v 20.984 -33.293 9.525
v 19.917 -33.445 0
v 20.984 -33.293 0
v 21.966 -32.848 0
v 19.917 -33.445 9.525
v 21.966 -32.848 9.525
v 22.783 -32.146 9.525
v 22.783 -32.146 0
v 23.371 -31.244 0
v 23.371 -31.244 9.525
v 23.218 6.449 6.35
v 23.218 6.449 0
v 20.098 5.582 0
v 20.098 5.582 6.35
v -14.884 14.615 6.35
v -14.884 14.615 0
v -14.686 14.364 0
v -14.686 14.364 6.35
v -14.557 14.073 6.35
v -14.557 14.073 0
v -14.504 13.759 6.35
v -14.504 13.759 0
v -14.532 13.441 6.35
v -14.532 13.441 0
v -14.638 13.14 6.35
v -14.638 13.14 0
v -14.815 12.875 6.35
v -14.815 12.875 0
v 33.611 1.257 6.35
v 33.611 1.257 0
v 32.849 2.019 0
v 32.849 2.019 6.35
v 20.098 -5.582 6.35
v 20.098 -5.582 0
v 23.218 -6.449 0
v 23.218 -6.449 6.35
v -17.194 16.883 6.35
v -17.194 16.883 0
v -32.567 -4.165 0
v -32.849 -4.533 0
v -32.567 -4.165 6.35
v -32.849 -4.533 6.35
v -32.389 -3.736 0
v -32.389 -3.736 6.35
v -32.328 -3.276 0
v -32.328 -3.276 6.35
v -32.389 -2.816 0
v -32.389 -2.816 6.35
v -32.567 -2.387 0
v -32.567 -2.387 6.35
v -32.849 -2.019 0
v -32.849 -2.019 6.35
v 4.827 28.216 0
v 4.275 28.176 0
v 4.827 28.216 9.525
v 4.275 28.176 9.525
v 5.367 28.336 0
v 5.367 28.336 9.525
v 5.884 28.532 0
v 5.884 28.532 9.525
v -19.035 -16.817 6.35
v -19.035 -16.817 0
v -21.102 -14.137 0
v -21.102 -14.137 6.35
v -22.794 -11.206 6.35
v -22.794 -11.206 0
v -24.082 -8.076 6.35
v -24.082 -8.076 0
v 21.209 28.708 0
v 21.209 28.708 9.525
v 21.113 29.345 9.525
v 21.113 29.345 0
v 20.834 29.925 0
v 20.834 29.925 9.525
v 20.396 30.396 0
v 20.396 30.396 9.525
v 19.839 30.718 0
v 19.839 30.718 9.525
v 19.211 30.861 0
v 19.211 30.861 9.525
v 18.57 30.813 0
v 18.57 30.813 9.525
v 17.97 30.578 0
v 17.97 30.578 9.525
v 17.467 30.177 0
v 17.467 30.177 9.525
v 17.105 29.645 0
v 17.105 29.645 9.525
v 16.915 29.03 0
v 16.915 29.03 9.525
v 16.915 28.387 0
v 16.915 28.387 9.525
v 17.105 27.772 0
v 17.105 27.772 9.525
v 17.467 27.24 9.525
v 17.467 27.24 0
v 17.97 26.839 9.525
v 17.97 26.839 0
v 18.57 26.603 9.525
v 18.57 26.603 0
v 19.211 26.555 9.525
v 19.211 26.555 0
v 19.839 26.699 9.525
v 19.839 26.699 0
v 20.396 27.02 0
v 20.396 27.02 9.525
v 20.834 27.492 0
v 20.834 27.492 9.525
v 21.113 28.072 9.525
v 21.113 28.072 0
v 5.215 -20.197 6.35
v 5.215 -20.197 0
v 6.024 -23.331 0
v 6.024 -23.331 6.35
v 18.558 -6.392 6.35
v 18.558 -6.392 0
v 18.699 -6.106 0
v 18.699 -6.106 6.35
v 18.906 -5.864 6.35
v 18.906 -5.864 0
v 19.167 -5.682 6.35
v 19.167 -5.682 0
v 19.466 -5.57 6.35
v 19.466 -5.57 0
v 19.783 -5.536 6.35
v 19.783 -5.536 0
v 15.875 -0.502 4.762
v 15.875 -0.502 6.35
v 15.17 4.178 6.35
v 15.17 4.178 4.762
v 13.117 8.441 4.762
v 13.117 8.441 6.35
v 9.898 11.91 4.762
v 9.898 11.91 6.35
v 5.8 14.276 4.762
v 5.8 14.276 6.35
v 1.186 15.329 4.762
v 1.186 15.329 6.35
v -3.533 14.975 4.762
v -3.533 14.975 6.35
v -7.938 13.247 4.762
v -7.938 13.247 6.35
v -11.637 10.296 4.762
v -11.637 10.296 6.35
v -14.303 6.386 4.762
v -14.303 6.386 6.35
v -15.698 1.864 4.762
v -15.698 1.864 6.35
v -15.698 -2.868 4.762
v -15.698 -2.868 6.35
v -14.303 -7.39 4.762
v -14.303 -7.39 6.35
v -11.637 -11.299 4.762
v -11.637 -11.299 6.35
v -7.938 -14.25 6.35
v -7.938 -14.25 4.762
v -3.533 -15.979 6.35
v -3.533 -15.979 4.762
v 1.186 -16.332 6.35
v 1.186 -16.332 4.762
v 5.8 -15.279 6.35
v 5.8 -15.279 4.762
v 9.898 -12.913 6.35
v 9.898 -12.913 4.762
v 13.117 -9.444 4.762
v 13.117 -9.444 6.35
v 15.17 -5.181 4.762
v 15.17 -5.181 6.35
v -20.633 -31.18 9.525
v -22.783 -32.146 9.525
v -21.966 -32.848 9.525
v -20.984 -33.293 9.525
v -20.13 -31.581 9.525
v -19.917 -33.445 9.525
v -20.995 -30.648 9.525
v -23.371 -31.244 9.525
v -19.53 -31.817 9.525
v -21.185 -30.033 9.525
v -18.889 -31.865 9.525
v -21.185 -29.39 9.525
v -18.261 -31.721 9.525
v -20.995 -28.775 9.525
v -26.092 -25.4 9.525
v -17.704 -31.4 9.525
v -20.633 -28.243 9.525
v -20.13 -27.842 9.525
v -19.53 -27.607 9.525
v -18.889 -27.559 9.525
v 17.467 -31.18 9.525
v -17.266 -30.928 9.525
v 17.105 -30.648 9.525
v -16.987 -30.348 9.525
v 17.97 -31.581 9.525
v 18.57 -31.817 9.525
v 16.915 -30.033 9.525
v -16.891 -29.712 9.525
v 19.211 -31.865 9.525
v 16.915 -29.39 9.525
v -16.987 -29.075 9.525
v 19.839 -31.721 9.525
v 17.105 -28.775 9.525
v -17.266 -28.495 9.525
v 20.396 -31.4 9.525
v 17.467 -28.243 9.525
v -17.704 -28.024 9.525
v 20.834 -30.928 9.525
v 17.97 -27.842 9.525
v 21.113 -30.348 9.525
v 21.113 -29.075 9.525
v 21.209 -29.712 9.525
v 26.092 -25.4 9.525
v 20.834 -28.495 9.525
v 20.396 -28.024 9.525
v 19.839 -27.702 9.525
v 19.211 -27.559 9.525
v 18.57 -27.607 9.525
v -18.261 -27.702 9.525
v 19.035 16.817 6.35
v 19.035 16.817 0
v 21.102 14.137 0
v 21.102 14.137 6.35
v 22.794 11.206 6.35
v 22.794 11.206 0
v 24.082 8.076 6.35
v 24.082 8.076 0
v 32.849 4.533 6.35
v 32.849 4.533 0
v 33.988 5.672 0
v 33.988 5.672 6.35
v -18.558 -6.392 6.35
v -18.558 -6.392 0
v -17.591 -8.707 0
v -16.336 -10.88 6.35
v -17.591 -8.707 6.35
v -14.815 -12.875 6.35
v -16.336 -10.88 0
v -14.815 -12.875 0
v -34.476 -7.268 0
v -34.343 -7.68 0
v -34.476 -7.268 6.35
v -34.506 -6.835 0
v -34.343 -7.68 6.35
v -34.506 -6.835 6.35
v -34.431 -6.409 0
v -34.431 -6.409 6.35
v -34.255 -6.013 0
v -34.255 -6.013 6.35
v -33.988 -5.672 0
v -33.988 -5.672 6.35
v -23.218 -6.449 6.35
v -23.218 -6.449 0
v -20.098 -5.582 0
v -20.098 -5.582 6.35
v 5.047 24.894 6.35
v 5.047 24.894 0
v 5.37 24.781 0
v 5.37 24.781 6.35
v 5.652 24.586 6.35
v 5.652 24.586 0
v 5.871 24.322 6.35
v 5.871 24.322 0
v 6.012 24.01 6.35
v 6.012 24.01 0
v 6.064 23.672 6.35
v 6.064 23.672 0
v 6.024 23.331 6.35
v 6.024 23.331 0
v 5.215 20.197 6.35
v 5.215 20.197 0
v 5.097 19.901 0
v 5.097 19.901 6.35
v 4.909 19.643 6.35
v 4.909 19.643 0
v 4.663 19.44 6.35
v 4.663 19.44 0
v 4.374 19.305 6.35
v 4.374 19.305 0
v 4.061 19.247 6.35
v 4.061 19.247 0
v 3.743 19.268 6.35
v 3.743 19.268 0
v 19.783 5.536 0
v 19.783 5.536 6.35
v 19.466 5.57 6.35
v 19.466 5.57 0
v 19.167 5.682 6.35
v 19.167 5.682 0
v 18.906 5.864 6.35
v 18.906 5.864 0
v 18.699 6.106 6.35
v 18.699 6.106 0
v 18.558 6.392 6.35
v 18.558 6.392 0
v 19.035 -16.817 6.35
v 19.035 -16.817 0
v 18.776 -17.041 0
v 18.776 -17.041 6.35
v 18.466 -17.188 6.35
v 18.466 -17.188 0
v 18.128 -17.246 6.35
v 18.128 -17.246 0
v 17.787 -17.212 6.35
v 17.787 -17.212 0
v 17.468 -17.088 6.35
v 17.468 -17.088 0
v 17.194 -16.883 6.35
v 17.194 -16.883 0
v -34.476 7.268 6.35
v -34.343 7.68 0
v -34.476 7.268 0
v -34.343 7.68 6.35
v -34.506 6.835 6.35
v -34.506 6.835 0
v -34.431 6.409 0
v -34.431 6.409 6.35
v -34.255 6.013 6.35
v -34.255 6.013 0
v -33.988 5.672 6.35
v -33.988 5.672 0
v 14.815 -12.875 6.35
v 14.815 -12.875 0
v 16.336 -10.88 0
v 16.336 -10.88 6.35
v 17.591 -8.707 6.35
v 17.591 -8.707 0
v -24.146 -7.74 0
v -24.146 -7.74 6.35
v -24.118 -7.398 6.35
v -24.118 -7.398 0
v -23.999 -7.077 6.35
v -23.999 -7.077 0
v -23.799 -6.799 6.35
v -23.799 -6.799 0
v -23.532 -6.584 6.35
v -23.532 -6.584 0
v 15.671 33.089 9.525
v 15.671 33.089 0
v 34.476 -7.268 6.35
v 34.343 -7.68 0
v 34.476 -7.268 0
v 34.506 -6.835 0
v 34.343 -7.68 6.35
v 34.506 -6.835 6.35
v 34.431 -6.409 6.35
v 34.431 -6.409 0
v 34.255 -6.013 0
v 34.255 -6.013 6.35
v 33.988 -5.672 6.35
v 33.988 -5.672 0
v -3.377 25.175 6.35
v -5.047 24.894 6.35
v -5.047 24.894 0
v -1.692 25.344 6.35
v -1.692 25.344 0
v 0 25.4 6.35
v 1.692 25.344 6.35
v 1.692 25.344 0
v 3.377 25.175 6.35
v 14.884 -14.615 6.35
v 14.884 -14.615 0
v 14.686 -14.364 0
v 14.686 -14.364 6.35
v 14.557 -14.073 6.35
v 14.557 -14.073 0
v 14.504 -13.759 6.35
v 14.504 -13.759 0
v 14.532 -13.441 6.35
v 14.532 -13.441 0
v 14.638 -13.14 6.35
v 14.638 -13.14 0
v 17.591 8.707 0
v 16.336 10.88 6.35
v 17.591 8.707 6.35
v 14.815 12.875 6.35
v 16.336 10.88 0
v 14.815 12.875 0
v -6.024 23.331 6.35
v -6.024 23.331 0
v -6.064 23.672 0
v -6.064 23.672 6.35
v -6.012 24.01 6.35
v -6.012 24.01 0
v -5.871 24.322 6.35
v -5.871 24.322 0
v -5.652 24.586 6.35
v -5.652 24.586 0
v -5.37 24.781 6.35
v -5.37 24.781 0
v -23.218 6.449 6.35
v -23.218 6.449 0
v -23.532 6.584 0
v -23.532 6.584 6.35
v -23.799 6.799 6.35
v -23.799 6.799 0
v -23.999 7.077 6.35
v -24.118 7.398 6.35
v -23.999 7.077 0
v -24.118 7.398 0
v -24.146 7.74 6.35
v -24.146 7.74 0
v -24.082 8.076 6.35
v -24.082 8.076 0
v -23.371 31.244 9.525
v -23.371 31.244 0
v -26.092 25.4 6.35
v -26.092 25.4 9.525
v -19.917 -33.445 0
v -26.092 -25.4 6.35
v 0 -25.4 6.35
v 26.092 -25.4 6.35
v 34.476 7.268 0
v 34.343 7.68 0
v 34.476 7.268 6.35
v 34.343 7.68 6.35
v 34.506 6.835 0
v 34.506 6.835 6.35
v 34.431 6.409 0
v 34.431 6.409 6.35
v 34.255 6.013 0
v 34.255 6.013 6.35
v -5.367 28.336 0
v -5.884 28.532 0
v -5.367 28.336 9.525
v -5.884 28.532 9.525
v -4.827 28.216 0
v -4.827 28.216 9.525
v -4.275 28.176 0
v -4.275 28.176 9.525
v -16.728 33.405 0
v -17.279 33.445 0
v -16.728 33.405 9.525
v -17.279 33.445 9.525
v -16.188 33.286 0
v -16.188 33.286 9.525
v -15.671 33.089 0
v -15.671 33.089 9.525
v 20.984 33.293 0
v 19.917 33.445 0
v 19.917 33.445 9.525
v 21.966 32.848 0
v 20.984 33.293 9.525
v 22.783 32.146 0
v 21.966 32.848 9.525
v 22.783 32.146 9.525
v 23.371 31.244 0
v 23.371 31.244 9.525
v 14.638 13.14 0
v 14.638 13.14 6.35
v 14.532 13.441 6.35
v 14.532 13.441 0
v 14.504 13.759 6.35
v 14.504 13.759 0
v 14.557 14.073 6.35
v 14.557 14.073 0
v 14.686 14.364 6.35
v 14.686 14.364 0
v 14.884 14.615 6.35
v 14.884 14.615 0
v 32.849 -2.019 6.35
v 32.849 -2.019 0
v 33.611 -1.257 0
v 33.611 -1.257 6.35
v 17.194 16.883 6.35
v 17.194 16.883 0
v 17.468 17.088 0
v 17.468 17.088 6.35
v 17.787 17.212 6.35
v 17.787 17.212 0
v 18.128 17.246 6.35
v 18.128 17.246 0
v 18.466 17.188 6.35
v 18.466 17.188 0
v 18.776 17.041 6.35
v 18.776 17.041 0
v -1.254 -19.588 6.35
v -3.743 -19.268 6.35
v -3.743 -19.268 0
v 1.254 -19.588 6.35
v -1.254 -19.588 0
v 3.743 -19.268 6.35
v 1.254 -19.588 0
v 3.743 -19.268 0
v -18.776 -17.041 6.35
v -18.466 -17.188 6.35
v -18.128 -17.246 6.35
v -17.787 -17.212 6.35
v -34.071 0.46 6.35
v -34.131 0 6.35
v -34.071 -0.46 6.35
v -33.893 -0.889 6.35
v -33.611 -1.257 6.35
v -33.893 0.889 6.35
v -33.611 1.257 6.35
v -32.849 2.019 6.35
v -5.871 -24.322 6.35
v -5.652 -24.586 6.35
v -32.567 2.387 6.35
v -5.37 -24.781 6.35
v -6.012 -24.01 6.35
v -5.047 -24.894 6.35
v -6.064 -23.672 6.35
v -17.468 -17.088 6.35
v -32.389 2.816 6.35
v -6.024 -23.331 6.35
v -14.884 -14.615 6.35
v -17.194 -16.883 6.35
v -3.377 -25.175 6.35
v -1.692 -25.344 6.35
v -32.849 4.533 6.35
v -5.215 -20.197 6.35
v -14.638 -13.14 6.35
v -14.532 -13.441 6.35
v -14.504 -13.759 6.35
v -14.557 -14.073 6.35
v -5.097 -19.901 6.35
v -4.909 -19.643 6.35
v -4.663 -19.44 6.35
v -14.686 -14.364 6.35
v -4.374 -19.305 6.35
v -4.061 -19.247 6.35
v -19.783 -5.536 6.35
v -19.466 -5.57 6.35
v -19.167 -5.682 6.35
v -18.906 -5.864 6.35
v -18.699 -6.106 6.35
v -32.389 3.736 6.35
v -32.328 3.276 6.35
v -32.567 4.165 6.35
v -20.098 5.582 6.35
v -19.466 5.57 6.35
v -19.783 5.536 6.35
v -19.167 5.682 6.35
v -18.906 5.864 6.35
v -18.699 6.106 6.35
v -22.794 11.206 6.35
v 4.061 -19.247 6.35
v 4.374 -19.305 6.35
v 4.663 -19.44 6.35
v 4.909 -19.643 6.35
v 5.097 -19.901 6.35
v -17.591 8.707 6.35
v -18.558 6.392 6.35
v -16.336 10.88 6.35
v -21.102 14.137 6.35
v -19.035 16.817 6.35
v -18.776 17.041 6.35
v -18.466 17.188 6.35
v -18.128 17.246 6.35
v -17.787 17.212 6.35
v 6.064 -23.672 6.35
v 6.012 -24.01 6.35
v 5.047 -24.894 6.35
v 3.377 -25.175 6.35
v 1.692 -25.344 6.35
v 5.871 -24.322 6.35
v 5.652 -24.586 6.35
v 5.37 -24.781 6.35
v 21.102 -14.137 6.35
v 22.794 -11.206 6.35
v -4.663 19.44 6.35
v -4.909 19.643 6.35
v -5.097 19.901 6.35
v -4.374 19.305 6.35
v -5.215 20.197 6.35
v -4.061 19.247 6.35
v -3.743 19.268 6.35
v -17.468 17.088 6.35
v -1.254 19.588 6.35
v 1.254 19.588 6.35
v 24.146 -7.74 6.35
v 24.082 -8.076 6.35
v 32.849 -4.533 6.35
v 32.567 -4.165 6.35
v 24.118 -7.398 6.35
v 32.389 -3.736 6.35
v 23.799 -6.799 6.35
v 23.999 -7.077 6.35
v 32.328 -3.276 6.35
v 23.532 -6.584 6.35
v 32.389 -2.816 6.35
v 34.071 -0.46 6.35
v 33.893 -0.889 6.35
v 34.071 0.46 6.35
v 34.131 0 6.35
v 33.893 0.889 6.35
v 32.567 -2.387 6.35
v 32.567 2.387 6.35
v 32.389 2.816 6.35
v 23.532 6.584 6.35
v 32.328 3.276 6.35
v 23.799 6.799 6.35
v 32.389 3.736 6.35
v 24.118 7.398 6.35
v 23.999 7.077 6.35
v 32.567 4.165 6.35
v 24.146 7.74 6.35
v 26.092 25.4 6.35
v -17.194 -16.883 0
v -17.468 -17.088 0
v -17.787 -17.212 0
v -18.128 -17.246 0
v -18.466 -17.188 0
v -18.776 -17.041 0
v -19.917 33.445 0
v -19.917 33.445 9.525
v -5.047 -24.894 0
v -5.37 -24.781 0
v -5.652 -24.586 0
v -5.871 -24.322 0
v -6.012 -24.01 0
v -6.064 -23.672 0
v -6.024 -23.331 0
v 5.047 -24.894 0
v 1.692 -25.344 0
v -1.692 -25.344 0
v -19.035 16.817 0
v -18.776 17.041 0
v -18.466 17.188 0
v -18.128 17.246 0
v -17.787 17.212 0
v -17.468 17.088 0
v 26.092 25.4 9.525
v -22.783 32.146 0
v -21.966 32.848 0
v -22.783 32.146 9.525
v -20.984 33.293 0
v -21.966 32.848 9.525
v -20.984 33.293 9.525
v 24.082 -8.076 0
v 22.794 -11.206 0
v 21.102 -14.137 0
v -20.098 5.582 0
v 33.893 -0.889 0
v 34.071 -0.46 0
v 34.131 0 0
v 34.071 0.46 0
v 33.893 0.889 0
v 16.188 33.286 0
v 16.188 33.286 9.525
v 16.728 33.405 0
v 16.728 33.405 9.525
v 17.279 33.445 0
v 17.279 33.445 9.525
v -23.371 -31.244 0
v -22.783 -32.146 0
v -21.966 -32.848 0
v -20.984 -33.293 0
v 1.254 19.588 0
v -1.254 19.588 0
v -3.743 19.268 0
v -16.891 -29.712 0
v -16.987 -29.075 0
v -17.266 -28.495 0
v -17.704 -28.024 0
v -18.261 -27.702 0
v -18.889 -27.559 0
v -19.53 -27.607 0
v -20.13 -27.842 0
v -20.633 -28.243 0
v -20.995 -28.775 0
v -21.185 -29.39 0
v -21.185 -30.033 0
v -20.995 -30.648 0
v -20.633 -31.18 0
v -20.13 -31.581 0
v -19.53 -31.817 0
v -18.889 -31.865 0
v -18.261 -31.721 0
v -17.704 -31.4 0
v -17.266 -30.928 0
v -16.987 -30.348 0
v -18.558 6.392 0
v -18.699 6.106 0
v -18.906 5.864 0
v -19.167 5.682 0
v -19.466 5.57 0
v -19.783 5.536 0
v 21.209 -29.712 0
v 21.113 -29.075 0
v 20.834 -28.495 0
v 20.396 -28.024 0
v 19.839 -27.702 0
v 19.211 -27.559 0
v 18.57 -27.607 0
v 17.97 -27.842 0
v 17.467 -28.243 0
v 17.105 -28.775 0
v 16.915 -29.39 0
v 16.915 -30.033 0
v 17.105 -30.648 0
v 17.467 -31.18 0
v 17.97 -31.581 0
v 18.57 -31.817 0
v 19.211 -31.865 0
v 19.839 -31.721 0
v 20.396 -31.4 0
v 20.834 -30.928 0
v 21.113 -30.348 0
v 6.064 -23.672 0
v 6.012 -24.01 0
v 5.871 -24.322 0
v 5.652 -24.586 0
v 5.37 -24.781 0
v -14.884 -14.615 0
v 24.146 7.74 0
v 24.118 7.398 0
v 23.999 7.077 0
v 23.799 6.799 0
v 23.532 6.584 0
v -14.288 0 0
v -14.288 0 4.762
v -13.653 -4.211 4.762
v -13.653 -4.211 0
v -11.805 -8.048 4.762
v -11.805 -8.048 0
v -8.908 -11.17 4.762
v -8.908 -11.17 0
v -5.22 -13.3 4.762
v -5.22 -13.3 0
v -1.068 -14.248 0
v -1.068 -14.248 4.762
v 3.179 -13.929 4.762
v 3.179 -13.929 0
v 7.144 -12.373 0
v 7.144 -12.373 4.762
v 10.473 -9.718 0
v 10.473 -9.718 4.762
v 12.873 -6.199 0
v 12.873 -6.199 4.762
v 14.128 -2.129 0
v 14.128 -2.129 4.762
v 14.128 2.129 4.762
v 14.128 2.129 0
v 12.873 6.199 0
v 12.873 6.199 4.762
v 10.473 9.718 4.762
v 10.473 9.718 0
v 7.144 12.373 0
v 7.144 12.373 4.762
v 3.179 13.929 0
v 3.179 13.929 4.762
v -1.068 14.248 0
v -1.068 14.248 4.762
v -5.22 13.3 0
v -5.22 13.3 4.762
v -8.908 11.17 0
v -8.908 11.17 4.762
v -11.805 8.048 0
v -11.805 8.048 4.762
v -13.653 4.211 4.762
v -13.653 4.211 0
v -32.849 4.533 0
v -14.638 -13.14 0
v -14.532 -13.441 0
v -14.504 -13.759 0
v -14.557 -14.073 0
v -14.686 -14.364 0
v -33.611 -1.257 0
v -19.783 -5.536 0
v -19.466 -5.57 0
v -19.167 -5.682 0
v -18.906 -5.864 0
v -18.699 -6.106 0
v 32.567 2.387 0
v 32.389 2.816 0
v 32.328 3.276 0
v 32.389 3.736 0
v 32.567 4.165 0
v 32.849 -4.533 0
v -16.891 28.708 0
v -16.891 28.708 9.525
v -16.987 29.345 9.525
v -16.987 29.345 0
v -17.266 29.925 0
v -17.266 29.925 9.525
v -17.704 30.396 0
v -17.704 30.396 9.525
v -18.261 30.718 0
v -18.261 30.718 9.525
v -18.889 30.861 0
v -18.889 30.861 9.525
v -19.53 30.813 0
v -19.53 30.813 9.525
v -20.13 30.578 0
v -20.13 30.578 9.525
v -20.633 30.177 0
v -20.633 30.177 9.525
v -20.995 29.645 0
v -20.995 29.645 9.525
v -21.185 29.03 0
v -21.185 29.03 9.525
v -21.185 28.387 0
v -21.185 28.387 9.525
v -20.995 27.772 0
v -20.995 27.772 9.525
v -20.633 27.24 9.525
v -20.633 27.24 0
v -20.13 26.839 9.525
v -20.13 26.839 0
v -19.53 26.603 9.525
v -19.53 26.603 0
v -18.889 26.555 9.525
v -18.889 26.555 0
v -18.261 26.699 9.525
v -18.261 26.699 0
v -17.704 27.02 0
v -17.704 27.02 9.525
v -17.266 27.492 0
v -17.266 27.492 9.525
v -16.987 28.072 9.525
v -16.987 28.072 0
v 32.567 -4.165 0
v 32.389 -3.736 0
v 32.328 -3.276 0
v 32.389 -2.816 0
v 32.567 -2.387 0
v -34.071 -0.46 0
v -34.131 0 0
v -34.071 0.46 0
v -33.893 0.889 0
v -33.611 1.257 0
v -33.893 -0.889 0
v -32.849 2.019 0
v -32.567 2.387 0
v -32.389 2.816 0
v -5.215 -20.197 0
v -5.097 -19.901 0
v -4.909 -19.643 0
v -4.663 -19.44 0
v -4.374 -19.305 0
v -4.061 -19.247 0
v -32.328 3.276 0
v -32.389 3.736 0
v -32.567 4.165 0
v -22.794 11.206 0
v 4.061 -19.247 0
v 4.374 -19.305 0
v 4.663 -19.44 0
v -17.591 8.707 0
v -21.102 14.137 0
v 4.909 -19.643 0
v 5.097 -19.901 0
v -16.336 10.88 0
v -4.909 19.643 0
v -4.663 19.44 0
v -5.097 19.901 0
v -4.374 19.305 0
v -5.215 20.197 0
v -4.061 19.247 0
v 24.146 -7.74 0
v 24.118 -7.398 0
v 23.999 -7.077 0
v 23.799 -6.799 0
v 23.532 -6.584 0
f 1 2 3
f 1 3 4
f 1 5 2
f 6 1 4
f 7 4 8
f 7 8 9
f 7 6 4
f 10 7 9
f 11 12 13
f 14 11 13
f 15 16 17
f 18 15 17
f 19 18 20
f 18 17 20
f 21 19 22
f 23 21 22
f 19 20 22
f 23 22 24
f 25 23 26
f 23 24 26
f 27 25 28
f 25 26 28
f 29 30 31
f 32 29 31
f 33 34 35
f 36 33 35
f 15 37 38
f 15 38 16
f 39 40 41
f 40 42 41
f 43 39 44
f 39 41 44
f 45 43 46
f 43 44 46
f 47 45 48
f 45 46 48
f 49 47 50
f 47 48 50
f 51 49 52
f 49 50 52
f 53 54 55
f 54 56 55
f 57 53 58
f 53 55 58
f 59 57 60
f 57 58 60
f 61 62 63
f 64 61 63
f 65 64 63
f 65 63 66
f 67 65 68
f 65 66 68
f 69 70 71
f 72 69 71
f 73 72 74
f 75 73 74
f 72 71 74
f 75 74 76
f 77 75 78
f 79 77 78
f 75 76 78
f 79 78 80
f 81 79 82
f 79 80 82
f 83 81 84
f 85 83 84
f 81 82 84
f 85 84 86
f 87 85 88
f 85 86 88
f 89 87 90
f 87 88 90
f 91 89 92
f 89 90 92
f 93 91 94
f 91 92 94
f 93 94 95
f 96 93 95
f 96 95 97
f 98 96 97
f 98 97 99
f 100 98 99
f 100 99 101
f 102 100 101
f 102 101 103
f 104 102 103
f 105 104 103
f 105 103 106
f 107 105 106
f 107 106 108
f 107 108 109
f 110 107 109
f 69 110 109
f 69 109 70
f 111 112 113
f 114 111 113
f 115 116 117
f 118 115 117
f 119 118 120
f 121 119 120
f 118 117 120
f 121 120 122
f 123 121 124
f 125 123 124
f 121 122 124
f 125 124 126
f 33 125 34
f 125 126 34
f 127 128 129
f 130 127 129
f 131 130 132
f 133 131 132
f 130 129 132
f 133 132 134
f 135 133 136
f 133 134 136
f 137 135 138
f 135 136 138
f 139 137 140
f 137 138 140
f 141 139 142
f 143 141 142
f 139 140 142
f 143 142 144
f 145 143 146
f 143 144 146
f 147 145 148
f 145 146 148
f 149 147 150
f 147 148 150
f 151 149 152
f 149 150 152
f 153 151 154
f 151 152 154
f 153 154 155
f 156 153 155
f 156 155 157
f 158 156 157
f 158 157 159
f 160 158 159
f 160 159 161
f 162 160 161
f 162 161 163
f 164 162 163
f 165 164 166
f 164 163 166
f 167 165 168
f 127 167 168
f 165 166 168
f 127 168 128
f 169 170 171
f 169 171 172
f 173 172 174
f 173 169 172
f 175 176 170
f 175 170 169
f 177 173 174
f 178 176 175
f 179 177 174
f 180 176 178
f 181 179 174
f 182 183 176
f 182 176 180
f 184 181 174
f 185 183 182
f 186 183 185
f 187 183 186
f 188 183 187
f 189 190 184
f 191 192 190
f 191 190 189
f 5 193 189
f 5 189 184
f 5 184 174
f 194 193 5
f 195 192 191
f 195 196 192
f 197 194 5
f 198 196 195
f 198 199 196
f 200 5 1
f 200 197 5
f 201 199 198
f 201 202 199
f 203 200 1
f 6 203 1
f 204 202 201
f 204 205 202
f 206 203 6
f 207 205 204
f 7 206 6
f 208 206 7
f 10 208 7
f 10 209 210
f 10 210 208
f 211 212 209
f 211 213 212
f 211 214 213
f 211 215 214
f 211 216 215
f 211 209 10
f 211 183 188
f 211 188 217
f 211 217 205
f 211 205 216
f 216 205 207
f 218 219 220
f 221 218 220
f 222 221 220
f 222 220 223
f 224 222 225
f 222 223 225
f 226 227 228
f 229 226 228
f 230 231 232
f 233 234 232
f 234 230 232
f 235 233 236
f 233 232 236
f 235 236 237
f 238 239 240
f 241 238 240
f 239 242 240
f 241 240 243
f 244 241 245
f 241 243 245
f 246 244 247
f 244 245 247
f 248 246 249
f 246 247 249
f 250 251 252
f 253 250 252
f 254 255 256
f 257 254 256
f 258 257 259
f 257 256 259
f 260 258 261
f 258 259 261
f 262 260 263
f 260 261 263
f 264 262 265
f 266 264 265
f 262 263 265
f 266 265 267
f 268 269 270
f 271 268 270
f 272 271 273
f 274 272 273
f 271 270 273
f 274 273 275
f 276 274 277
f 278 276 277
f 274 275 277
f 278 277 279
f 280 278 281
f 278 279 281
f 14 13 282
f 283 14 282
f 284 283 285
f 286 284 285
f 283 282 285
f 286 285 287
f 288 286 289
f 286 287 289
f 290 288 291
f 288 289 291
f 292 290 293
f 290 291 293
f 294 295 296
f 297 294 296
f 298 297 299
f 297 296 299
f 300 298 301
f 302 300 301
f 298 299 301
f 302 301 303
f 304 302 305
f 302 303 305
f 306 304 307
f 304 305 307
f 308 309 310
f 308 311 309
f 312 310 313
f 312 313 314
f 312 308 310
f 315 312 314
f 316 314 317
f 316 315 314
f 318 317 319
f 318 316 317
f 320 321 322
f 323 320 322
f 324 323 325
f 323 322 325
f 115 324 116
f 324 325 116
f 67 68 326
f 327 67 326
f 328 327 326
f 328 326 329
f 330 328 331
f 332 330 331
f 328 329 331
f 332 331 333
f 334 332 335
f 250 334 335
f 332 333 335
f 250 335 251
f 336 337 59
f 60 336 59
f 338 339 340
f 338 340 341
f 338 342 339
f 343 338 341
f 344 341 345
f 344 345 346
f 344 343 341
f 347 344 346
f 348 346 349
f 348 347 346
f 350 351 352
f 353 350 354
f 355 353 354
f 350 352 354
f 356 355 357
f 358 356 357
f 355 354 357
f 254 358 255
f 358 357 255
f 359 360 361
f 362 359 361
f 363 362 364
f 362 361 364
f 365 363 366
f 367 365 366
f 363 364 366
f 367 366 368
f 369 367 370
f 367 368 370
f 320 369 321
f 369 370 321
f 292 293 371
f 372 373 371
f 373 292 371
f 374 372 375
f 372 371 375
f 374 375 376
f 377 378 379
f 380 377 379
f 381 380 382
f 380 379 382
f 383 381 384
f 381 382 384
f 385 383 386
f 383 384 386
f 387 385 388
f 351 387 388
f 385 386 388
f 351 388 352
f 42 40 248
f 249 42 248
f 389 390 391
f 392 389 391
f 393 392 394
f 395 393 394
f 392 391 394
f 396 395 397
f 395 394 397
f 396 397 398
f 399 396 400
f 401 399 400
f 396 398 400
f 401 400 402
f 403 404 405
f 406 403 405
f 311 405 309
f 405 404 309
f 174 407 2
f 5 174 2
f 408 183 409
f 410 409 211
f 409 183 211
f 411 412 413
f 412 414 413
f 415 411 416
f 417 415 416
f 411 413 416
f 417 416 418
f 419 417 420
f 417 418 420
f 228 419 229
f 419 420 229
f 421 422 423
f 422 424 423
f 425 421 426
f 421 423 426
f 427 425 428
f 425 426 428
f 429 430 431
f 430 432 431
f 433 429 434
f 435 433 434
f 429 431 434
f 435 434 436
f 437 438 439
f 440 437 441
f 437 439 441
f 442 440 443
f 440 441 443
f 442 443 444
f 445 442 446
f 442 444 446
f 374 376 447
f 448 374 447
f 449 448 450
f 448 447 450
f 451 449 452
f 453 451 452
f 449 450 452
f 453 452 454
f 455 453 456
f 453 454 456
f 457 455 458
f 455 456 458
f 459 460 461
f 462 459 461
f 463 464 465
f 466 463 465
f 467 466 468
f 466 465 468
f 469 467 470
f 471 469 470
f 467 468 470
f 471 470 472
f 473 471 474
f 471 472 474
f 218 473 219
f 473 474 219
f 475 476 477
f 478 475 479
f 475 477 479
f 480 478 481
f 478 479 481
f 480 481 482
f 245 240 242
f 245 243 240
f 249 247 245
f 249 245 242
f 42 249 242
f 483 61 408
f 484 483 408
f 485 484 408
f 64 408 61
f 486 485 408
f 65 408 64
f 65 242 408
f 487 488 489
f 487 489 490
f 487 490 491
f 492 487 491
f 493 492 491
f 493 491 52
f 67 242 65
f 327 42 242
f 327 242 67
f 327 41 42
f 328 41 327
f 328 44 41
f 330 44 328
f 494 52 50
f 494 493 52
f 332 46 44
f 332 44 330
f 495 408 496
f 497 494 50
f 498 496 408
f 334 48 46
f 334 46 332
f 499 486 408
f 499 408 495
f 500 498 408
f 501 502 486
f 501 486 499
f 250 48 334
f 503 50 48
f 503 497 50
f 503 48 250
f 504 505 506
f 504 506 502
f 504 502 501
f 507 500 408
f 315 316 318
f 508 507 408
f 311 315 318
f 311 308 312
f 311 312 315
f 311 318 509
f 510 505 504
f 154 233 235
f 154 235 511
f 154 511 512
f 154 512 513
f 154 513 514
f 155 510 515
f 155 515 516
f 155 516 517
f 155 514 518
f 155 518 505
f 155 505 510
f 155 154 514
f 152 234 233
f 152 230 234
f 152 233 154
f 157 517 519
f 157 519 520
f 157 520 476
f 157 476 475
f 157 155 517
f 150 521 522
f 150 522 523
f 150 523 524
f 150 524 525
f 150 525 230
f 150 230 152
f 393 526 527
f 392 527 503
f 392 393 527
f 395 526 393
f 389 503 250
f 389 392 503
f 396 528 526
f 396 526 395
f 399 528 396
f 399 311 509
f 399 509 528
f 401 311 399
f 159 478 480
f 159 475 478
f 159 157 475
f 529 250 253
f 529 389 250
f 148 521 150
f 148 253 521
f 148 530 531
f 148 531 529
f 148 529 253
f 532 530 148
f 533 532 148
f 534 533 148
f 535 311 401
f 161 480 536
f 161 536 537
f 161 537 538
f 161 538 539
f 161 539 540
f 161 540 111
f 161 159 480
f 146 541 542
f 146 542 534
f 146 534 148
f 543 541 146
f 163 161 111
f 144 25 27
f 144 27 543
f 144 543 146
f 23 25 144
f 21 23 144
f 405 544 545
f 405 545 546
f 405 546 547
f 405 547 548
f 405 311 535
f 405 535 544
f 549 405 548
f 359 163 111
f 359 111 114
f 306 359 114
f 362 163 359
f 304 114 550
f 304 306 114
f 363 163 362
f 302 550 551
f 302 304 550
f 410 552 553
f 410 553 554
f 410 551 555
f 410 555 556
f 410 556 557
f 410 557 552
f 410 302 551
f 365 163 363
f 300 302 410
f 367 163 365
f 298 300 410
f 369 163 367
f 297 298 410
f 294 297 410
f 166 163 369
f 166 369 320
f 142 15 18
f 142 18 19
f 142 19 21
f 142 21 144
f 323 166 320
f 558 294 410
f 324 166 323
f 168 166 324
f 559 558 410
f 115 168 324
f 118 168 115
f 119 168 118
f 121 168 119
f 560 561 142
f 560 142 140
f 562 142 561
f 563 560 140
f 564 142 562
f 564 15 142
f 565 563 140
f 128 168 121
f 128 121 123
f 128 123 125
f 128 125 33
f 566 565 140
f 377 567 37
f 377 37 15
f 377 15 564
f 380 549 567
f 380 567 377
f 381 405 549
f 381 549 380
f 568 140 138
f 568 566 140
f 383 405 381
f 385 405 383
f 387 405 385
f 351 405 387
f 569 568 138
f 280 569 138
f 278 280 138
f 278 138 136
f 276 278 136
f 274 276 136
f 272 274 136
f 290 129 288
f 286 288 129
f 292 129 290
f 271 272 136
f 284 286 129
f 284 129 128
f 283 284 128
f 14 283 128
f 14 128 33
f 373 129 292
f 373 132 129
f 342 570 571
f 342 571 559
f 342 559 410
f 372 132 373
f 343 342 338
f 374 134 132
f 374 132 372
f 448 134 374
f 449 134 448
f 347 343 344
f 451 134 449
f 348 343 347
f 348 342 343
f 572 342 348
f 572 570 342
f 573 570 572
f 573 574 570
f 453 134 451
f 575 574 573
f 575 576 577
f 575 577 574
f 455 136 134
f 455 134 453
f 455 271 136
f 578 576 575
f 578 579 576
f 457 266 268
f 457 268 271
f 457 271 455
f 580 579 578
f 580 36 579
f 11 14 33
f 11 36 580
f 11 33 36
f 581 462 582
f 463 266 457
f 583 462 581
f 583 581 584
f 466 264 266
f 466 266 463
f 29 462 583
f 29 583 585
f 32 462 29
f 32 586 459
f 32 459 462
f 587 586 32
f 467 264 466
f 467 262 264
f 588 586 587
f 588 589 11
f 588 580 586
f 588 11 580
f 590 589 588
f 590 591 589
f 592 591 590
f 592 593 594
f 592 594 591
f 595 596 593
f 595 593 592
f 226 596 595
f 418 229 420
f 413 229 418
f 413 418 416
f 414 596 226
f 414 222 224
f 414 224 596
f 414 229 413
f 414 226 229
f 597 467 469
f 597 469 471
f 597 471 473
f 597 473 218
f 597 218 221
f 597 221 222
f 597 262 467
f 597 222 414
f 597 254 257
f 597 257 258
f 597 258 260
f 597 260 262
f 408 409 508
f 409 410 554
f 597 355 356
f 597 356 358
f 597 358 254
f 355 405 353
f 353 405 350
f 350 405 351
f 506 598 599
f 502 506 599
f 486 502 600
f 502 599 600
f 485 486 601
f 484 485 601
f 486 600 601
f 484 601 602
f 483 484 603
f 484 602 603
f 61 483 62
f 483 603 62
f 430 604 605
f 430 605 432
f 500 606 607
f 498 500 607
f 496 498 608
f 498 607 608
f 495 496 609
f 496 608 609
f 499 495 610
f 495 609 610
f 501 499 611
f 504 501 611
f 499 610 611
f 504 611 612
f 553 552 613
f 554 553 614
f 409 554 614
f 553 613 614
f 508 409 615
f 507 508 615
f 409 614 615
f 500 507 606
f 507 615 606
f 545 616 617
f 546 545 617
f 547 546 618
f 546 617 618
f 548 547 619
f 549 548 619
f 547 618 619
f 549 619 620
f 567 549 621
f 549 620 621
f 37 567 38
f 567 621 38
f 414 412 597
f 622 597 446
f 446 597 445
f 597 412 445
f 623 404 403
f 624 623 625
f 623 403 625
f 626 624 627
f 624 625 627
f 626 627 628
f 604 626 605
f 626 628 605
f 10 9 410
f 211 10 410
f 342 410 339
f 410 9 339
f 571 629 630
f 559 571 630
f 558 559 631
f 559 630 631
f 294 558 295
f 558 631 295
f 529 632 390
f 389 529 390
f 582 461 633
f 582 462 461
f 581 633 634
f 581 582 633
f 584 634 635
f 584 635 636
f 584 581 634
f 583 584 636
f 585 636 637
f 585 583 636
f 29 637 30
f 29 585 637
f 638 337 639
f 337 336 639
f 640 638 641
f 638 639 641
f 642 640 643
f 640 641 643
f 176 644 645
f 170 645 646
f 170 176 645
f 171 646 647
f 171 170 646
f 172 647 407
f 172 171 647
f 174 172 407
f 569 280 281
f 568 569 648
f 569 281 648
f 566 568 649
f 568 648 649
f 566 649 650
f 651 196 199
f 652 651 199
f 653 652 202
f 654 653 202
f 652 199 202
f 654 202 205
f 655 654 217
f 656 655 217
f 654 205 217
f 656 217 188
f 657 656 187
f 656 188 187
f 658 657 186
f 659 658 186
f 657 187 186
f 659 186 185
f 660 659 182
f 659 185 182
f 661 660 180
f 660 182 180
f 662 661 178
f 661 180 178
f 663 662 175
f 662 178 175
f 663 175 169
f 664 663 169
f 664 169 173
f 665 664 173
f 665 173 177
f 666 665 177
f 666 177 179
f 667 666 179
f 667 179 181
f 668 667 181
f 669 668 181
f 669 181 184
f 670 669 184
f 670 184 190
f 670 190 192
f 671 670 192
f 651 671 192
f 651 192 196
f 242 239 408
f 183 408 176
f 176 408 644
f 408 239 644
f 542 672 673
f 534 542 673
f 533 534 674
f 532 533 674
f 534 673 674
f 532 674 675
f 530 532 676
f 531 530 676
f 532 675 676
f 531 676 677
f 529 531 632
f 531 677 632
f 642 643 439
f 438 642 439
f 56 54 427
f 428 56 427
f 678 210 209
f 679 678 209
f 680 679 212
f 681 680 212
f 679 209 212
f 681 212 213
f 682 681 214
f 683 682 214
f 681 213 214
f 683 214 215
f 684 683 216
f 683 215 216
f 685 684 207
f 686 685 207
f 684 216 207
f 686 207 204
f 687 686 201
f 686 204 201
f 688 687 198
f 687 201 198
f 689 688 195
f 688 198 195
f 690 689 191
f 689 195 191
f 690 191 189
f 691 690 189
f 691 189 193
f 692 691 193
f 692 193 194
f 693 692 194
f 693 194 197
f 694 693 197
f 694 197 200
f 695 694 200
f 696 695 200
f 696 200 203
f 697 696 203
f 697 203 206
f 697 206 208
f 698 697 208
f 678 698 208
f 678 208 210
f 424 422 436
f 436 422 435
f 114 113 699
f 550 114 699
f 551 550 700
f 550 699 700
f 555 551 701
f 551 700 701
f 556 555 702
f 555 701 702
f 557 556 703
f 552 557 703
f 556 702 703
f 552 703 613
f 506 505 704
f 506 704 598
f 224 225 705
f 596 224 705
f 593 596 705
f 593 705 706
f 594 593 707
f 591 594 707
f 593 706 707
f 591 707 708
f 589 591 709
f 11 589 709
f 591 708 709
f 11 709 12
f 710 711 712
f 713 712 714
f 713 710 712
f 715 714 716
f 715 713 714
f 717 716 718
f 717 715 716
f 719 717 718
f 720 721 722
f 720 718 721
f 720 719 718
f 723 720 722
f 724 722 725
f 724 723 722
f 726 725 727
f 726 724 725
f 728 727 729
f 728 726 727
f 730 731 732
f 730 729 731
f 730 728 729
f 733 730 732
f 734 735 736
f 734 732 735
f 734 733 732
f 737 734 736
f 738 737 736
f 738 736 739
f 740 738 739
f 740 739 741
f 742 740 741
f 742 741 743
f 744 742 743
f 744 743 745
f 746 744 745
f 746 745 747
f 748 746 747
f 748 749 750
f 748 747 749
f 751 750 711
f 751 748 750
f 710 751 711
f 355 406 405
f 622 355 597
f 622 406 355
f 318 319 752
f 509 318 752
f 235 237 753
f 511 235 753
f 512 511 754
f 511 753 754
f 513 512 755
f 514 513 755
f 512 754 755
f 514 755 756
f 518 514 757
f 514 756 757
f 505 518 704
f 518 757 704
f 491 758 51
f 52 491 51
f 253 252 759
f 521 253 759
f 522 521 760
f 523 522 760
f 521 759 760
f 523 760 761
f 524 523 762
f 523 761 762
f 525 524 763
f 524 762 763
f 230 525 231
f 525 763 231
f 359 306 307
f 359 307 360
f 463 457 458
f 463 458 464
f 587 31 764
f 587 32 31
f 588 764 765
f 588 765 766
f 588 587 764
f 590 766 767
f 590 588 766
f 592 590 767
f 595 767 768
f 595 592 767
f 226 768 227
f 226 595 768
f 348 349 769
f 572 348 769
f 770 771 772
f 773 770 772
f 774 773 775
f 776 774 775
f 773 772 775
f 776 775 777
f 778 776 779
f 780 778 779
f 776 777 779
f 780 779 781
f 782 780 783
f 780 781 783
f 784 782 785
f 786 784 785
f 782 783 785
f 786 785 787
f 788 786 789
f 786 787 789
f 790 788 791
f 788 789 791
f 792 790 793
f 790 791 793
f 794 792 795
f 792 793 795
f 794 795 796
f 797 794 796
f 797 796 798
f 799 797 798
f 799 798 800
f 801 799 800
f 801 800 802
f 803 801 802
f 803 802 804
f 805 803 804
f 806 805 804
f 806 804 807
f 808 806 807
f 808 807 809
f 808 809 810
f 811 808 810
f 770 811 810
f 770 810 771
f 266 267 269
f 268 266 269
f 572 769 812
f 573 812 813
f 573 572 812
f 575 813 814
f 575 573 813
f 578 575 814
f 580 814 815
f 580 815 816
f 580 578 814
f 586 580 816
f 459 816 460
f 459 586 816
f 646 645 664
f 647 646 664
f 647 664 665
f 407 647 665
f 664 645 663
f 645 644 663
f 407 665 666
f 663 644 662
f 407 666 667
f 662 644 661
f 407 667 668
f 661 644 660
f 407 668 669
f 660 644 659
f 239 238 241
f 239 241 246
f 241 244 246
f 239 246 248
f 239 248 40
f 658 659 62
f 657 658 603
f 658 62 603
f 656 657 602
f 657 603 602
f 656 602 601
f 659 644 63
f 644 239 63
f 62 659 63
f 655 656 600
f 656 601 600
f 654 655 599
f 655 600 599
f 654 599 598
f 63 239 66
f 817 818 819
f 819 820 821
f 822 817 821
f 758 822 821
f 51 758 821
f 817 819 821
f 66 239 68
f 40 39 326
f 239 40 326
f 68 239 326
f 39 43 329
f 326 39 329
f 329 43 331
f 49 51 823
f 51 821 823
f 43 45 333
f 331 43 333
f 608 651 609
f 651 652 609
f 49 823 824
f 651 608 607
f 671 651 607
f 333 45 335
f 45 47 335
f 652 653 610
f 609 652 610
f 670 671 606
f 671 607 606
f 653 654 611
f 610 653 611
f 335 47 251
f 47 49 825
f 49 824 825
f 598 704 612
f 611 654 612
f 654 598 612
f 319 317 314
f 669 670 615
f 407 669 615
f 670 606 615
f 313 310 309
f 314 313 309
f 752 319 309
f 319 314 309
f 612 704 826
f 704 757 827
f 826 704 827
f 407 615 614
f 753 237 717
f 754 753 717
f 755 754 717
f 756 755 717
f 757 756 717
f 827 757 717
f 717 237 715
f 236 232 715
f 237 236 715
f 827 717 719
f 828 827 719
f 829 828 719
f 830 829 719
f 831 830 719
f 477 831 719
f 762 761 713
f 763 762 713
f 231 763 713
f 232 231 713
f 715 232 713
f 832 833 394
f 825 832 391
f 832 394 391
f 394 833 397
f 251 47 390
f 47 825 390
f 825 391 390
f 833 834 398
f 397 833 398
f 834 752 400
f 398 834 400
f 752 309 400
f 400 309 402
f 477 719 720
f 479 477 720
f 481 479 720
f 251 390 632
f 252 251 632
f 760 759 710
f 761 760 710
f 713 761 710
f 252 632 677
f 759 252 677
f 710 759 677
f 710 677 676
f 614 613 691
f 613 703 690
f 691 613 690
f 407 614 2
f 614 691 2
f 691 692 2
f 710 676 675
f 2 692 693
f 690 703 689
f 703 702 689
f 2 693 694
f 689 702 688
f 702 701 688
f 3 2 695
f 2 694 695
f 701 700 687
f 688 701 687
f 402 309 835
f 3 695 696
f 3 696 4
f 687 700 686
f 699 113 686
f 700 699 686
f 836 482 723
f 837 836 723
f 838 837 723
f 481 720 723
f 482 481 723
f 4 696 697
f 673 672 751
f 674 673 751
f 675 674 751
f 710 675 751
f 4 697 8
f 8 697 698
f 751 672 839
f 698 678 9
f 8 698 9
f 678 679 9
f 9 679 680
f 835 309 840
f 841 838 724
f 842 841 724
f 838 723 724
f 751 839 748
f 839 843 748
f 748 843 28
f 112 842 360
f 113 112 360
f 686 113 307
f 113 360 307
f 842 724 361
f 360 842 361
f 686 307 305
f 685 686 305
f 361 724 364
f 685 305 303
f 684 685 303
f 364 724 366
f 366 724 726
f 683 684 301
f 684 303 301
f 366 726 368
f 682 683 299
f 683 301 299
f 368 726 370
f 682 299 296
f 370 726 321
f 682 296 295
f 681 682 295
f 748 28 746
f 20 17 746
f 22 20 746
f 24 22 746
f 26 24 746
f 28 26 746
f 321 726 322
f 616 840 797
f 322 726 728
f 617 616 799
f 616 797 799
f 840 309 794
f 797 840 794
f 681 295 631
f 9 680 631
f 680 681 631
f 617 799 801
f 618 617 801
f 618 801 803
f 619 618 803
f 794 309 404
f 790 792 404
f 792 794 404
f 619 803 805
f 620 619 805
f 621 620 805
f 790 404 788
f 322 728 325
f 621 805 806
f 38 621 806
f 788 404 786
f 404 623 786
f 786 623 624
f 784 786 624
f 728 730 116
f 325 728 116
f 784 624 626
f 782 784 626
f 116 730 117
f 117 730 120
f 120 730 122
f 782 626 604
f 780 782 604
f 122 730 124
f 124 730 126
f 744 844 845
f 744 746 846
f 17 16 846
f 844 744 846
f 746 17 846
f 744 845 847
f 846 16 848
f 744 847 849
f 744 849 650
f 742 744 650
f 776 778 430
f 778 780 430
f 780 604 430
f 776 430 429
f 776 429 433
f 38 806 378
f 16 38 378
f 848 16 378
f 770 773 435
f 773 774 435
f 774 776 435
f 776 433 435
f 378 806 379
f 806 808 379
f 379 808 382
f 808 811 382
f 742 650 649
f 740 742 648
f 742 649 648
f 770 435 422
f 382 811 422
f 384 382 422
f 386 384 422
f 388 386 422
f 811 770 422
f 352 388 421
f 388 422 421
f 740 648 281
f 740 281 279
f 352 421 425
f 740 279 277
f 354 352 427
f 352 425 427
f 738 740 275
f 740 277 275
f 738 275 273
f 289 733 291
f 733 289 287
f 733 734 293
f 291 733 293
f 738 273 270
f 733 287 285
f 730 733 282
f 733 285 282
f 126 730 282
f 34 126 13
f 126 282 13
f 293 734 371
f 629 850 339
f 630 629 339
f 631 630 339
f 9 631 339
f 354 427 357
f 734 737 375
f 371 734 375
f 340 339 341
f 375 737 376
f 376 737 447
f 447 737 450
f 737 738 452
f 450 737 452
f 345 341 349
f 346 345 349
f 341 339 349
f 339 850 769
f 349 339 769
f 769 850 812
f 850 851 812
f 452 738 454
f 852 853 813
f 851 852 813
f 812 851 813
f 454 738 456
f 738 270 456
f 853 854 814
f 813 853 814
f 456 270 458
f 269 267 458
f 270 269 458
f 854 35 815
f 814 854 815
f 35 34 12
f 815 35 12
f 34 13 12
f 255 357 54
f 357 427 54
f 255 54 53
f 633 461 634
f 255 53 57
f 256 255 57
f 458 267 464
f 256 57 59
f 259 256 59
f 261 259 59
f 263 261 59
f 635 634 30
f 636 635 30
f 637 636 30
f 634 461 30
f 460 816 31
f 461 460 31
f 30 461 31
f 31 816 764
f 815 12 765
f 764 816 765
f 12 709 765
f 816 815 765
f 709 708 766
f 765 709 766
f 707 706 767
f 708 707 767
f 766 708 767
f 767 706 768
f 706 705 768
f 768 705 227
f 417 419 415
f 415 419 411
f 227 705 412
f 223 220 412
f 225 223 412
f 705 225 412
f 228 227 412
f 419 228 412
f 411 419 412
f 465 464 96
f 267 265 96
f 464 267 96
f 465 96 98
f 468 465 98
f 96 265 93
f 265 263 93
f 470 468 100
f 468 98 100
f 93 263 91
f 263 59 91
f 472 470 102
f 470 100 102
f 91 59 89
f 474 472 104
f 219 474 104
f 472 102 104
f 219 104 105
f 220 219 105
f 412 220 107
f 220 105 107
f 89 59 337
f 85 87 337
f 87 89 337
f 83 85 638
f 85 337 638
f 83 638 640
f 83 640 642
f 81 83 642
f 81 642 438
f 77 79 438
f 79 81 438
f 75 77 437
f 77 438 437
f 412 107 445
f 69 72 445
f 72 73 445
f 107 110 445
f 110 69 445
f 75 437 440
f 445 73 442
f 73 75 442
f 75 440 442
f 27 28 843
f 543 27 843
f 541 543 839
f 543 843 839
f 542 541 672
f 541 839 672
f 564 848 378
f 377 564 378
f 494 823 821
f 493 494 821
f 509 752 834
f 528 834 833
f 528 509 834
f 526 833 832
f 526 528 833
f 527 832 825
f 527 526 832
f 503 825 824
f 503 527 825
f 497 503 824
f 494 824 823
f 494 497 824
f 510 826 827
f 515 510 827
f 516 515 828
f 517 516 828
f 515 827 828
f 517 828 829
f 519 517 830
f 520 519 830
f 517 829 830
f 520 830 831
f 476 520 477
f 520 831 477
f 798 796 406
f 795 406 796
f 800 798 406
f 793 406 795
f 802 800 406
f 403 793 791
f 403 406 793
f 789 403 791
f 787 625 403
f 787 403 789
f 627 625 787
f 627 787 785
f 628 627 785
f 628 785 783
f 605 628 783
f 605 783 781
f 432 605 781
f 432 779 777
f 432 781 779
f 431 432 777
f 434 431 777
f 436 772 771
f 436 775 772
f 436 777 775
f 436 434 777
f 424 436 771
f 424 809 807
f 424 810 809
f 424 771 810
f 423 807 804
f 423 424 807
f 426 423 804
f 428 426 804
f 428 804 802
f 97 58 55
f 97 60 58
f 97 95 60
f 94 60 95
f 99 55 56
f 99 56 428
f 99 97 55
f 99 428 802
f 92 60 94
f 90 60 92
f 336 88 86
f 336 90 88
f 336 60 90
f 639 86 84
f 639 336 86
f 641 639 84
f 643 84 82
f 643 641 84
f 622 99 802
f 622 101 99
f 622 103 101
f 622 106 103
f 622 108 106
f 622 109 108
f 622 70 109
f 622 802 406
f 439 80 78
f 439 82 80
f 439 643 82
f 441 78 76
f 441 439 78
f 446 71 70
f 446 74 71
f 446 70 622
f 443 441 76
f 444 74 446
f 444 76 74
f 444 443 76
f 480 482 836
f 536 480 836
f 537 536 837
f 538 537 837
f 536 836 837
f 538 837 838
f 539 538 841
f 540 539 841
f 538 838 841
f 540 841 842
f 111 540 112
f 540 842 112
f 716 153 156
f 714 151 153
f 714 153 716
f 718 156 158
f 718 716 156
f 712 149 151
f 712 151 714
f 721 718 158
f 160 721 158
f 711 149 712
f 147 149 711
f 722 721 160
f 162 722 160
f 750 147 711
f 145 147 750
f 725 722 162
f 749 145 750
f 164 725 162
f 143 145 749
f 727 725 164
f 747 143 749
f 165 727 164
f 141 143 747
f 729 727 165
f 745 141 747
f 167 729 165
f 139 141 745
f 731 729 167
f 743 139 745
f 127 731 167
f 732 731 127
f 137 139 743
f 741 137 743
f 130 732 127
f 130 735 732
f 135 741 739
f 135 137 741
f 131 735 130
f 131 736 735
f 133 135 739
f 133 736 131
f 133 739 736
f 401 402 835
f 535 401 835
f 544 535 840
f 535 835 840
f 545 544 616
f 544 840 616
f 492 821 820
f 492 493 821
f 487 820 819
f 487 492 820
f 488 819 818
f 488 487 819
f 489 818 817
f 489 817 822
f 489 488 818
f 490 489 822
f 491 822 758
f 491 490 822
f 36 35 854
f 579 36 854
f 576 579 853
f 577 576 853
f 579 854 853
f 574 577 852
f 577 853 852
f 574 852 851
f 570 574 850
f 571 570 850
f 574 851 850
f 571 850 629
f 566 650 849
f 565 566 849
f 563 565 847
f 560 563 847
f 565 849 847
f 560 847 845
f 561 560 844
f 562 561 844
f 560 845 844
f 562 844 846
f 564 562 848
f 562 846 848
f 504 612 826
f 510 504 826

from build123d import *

# Parameters (mm, degrees)
SKETCH1_W           = 69.7357
SKETCH1_H           = 66.8909
SKETCH1_R           = 14.2875
BOSS_EXTRUDE1_DEPTH = 9.525
SKETCH2_W           = 89.996819584
SKETCH2_H           = 50.8
CUT_EXTRUDE1_DEPTH  = 3.175
SKETCH3_R           = 15.875
CUT_EXTRUDE2_DEPTH  = 1.5875
CUT_EXTRUDE3_DEPTH  = 50.245210065
FILLET1_R           = 3.81
FILLET2_R           = 1.778
CUT_EXTRUDE4_DEPTH  = 49.991669707
SKETCH6_R           = 2.159
CUT_EXTRUDE5_DEPTH  = 49.991669707


with BuildPart() as part:
    # Sketch1 → Boss-Extrude1 (new body)
    with BuildSketch(Plane.XY):
        Rectangle(SKETCH1_W, SKETCH1_H)
        with Locations(Location((0, 0, 0), (0, 0, 180))):
            Circle(SKETCH1_R, mode=Mode.SUBTRACT)
    extrude(amount=BOSS_EXTRUDE1_DEPTH)

    # Sketch2 → Cut-Extrude1 (cut)
    with BuildSketch(Plane.XY.offset(9.525)):
        Rectangle(SKETCH2_W, SKETCH2_H)
    extrude(amount=-CUT_EXTRUDE1_DEPTH, mode=Mode.SUBTRACT)

    # Sketch3 → Cut-Extrude2 (cut)
    with BuildSketch(Plane.XY.offset(6.35)):
        with Locations((0, -0.50165)):
            Circle(SKETCH3_R)
    extrude(amount=-CUT_EXTRUDE2_DEPTH, mode=Mode.SUBTRACT)

    # Sketch4 → Cut-Extrude3 (cut, through all)
    with BuildSketch(Plane(origin=(0, 0, 0), x_dir=(-1, 0, 0), z_dir=(0, 0, -1))):
        Polygon((-34.86785, 6.551654679), (-22.346309376, 33.44545), (-34.86785, 33.44545), align=None)
        Polygon((-31.592022661, 3.275827339), (-34.86785, 6.551654679), (-34.86785, 0), align=None)
        Polygon((-31.592022661, -3.275827339), (-34.86785, 0), (-34.86785, -6.551654679), align=None)
        Polygon((-22.346309376, -33.44545), (-34.86785, -6.551654679), (-34.86785, -33.44545), align=None)
        Polygon((34.86785, -33.44545), (34.86785, -6.551654679), (22.346309376, -33.44545), align=None)
        Polygon((-5.118898156, 28.176296472), (5.118898156, 28.176296472), (16.435998884, 33.44545), (-16.435998884, 33.44545), align=None)
        Polygon((34.86785, 33.44545), (22.346309376, 33.44545), (34.86785, 6.551654679), align=None)
        Polygon((34.86785, 0), (34.86785, 6.551654679), (31.592022661, 3.275827339), align=None)
        Polygon((34.86785, -6.551654679), (34.86785, 0), (31.592022661, -3.275827339), align=None)
    extrude(amount=-CUT_EXTRUDE3_DEPTH, mode=Mode.SUBTRACT)

    # Fillet1
    fillet1_edges = [part.edges().sort_by_distance(p)[0] for p in [
        (-5.118898156, 28.176296472, 4.7625),
        (5.118898156, 28.176296472, 4.7625),
        (16.435998884, 33.44545, 4.7625),
        (-16.435998884, 33.44545, 4.7625),
        (-22.346309376, 33.44545, 4.7625),
        (22.346309376, 33.44545, 4.7625),
        (22.346309376, -33.44545, 4.7625),
        (-22.346309376, -33.44545, 4.7625),
    ]]
    fillet(fillet1_edges, radius=FILLET1_R)

    # Fillet2
    fillet2_edges = [part.edges().sort_by_distance(p)[0] for p in [
        (31.592022661, -3.275827339, 3.175),
        (-34.86785, 6.551654679, 3.175),
        (-34.86785, 0, 3.175),
        (-31.592022661, 3.275827339, 3.175),
        (-31.592022661, -3.275827339, 3.175),
        (34.86785, 6.551654679, 3.175),
        (31.592022661, 3.275827339, 3.175),
        (34.86785, 0, 3.175),
        (34.86785, -6.551654679, 3.175),
        (-34.86785, -6.551654679, 3.175),
    ]]
    fillet(fillet2_edges, radius=FILLET2_R)

    # Sketch5 → Cut-Extrude4 (cut, through all)
    with BuildSketch(Plane(origin=(0, 0, 0), x_dir=(-1, 0, 0), z_dir=(0, 0, -1))):
        with BuildLine():
            Line((5.214806052, 20.196856995), (6.024138943, 23.3313898))
            ThreePointArc((6.024138943, 23.3313898), (5.871123899, 24.322469299), (5.046807084, 24.893568211))
            ThreePointArc((5.046807084, 24.893568211), (0, 25.4), (-5.046807084, 24.893568211))
            ThreePointArc((-5.046807084, 24.893568211), (-5.871123899, 24.322469299), (-6.024138943, 23.3313898))
            Line((-6.024138943, 23.3313898), (-5.214806052, 20.196856995))
            ThreePointArc((-5.214806052, 20.196856995), (-4.663096918, 19.440454734), (-3.742950076, 19.267662556))
            ThreePointArc((-3.742950076, 19.267662556), (0, 19.62785), (3.742950076, 19.267662556))
            ThreePointArc((3.742950076, 19.267662556), (4.663096918, 19.440454734), (5.214806052, 20.196856995))
        make_face()
        with BuildLine():
            Line((20.09839426, 5.58227398), (23.217645744, 6.44863754))
            ThreePointArc((23.217645744, 6.44863754), (23.999438245, 7.076692204), (24.081866003, 8.076120962))
            ThreePointArc((24.081866003, 8.076120962), (21.997045256, 12.7), (19.035058919, 16.817447248))
            ThreePointArc((19.035058919, 16.817447248), (18.128314346, 17.245777095), (17.193506801, 16.88275226))
            Line((17.193506801, 16.88275226), (14.883588208, 14.614583014))
            ThreePointArc((14.883588208, 14.614583014), (14.504379202, 13.758587758), (14.814810207, 12.875321128))
            ThreePointArc((14.814810207, 12.875321128), (16.998216722, 9.813925), (18.557760282, 6.392341427))
            ThreePointArc((18.557760282, 6.392341427), (19.16747612, 5.681866976), (20.09839426, 5.58227398))
        make_face()
        with BuildLine():
            Line((14.883588208, -14.614583014), (17.193506801, -16.88275226))
            ThreePointArc((17.193506801, -16.88275226), (18.128314346, -17.245777095), (19.035058919, -16.817447248))
            ThreePointArc((19.035058919, -16.817447248), (21.997045256, -12.7), (24.081866003, -8.076120962))
            ThreePointArc((24.081866003, -8.076120962), (23.999438245, -7.076692204), (23.217645744, -6.44863754))
            Line((23.217645744, -6.44863754), (20.09839426, -5.58227398))
            ThreePointArc((20.09839426, -5.58227398), (19.16747612, -5.681866976), (18.557760282, -6.392341427))
            ThreePointArc((18.557760282, -6.392341427), (16.998216722, -9.813925), (14.814810207, -12.875321128))
            ThreePointArc((14.814810207, -12.875321128), (14.504379202, -13.758587758), (14.883588208, -14.614583014))
        make_face()
        with BuildLine():
            Line((-5.214806052, -20.196856995), (-6.024138943, -23.3313898))
            ThreePointArc((-6.024138943, -23.3313898), (-5.871123899, -24.322469299), (-5.046807084, -24.893568211))
            ThreePointArc((-5.046807084, -24.893568211), (0, -25.4), (5.046807084, -24.893568211))
            ThreePointArc((5.046807084, -24.893568211), (5.871123899, -24.322469299), (6.024138943, -23.3313898))
            Line((6.024138943, -23.3313898), (5.214806052, -20.196856995))
            ThreePointArc((5.214806052, -20.196856995), (4.663096918, -19.440454734), (3.742950076, -19.267662556))
            ThreePointArc((3.742950076, -19.267662556), (0, -19.62785), (-3.742950076, -19.267662556))
            ThreePointArc((-3.742950076, -19.267662556), (-4.663096918, -19.440454734), (-5.214806052, -20.196856995))
        make_face()
        with BuildLine():
            Line((-20.09839426, -5.58227398), (-23.217645744, -6.44863754))
            ThreePointArc((-23.217645744, -6.44863754), (-23.999438245, -7.076692204), (-24.081866003, -8.076120962))
            ThreePointArc((-24.081866003, -8.076120962), (-21.997045256, -12.7), (-19.035058919, -16.817447248))
            ThreePointArc((-19.035058919, -16.817447248), (-18.128314346, -17.245777095), (-17.193506801, -16.88275226))
            Line((-17.193506801, -16.88275226), (-14.883588208, -14.614583014))
            ThreePointArc((-14.883588208, -14.614583014), (-14.504379202, -13.758587758), (-14.814810207, -12.875321128))
            ThreePointArc((-14.814810207, -12.875321128), (-16.998216722, -9.813925), (-18.557760282, -6.392341427))
            ThreePointArc((-18.557760282, -6.392341427), (-19.16747612, -5.681866976), (-20.09839426, -5.58227398))
        make_face()
        with BuildLine():
            Line((-14.883588208, 14.614583014), (-17.193506801, 16.88275226))
            ThreePointArc((-17.193506801, 16.88275226), (-18.128314346, 17.245777095), (-19.035058919, 16.817447248))
            ThreePointArc((-19.035058919, 16.817447248), (-21.997045256, 12.7), (-24.081866003, 8.076120962))
            ThreePointArc((-24.081866003, 8.076120962), (-23.999438245, 7.076692204), (-23.217645744, 6.44863754))
            Line((-23.217645744, 6.44863754), (-20.09839426, 5.58227398))
            ThreePointArc((-20.09839426, 5.58227398), (-19.16747612, 5.681866976), (-18.557760282, 6.392341427))
            ThreePointArc((-18.557760282, 6.392341427), (-16.998216722, 9.813925), (-14.814810207, 12.875321128))
            ThreePointArc((-14.814810207, 12.875321128), (-14.504379202, 13.758587758), (-14.883588208, 14.614583014))
        make_face()
    extrude(amount=-CUT_EXTRUDE4_DEPTH, mode=Mode.SUBTRACT)

    # Sketch6 → Cut-Extrude5 (cut, through all)
    with BuildSketch(Plane.XY.offset(9.525)):
        with Locations((-19.05, 28.70835)):
            Circle(SKETCH6_R)
        with Locations((19.05, 28.70835)):
            Circle(SKETCH6_R)
        with Locations((-19.05, -29.71165)):
            Circle(SKETCH6_R)
        with Locations((19.05, -29.71165)):
            Circle(SKETCH6_R)
    extrude(amount=-CUT_EXTRUDE5_DEPTH, mode=Mode.SUBTRACT)


solid = part.part
